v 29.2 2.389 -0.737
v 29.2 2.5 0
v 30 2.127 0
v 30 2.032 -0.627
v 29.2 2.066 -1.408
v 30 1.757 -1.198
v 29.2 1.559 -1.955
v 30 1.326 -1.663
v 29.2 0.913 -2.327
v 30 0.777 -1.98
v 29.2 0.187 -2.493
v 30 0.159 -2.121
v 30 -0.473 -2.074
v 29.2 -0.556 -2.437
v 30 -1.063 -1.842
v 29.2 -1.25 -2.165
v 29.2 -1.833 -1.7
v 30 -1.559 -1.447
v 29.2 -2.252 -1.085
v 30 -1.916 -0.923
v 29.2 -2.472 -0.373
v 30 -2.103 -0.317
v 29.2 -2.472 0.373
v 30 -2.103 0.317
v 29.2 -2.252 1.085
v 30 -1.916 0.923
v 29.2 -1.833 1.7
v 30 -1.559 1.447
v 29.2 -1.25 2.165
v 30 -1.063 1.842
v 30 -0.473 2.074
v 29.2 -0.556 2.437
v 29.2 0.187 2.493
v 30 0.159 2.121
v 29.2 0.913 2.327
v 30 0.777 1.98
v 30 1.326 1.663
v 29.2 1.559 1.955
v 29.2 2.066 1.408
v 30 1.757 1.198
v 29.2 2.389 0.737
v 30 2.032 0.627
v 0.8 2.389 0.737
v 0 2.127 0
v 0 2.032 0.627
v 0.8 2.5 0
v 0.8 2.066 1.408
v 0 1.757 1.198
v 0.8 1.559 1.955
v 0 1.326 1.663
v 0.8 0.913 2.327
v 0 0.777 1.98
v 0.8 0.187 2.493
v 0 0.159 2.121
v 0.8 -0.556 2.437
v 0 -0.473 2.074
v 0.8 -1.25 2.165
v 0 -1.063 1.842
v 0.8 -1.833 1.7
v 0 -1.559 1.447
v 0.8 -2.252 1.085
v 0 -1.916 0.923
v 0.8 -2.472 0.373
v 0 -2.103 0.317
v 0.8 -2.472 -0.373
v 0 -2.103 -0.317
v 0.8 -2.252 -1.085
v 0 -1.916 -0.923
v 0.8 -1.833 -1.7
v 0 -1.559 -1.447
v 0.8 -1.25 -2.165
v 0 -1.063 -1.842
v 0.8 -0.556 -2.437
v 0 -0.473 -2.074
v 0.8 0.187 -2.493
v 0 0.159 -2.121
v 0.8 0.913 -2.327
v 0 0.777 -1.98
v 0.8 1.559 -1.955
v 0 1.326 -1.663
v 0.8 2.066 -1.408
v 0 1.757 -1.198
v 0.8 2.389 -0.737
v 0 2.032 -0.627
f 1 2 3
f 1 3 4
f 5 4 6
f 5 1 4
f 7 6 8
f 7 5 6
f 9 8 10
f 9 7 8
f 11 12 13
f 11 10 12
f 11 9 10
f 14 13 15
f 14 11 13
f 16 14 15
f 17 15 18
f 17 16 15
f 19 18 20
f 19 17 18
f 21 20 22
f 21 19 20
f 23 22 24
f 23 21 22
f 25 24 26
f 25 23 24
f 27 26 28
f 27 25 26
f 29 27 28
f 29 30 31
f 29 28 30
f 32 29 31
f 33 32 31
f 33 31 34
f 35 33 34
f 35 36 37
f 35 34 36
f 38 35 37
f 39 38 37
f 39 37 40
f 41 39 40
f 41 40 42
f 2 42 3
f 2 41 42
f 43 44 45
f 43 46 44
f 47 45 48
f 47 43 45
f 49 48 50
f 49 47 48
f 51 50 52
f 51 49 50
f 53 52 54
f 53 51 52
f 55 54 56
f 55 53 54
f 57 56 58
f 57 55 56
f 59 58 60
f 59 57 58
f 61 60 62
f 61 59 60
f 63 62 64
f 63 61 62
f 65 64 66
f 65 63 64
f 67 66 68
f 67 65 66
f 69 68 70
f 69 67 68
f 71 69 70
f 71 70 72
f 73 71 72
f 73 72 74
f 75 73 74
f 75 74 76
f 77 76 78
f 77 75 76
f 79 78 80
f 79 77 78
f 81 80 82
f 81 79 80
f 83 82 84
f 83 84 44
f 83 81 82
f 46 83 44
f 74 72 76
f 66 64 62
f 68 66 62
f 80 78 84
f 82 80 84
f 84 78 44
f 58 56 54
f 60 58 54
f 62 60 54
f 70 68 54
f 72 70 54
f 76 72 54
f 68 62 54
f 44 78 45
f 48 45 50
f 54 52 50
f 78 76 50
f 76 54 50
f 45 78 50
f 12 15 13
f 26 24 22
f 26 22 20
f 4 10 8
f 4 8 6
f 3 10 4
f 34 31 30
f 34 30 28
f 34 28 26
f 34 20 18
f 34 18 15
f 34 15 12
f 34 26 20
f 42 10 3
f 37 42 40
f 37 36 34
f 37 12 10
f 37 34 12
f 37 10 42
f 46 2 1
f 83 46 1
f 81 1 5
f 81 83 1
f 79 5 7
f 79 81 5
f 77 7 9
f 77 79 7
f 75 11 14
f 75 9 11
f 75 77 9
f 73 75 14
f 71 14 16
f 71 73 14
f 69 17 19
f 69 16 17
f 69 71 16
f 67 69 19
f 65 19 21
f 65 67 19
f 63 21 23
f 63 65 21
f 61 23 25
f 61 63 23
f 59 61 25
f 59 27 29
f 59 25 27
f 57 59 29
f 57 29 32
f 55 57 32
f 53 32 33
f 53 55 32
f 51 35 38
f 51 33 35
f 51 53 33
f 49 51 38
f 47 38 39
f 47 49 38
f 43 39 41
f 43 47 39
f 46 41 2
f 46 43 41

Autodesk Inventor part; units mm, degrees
ref_plane "YZ Plane" through (0, 0, 0) normal (1, 0, 0) x (0, 1, 0)
ref_plane "XZ Plane" through (0, 0, 0) normal (0, 1, 0) x (-1, 0, 0)
ref_plane "XY Plane" through (0, 0, 0) normal (0, 0, 1) x (1, 0, 0)
sketch "Эскиз" plane through (0, 0, 0) normal (1, 0, 0) x (0, 1, 0)
  circle A0 centre (0, 0) radius 2.5
  dimension "d1" = 5
extrude "Базовый элемент" add sketch "Эскиз" along normal blind 30
chamfer "Фаска1" distance 0.8 angle 25 1 edges at (0, -2.5, 0) measured on face at (20, 2.4919, -0.2012)
chamfer "Эскиз2" distance 0.8 angle 25 1 edges at (30, -2.5, 0) measured on face at (20.2667, 2.4919, -0.2012)
equation "\"d1\" = NND"
equation "\"d2\" = NLG"
equation "\"d8\" = PHH"
equation "\"d9\" = FAWI"
equation "\"d12\" = PHH"
equation "\"d4\" = PHH"
equation "\"d5\" = FAWI"
equation "\"d11\" = PHH"
equation "\"NND\" = 5"
equation "\"NLG\" = 30"
equation "\"PHH\" = 0.8"
equation "\"FAWI\" = 25deg"
equation "\"KAH\" = 0"
properties part number "Штифт 2.5x30 ГОСТ 3128-70" material "Сталь, мягкая"
